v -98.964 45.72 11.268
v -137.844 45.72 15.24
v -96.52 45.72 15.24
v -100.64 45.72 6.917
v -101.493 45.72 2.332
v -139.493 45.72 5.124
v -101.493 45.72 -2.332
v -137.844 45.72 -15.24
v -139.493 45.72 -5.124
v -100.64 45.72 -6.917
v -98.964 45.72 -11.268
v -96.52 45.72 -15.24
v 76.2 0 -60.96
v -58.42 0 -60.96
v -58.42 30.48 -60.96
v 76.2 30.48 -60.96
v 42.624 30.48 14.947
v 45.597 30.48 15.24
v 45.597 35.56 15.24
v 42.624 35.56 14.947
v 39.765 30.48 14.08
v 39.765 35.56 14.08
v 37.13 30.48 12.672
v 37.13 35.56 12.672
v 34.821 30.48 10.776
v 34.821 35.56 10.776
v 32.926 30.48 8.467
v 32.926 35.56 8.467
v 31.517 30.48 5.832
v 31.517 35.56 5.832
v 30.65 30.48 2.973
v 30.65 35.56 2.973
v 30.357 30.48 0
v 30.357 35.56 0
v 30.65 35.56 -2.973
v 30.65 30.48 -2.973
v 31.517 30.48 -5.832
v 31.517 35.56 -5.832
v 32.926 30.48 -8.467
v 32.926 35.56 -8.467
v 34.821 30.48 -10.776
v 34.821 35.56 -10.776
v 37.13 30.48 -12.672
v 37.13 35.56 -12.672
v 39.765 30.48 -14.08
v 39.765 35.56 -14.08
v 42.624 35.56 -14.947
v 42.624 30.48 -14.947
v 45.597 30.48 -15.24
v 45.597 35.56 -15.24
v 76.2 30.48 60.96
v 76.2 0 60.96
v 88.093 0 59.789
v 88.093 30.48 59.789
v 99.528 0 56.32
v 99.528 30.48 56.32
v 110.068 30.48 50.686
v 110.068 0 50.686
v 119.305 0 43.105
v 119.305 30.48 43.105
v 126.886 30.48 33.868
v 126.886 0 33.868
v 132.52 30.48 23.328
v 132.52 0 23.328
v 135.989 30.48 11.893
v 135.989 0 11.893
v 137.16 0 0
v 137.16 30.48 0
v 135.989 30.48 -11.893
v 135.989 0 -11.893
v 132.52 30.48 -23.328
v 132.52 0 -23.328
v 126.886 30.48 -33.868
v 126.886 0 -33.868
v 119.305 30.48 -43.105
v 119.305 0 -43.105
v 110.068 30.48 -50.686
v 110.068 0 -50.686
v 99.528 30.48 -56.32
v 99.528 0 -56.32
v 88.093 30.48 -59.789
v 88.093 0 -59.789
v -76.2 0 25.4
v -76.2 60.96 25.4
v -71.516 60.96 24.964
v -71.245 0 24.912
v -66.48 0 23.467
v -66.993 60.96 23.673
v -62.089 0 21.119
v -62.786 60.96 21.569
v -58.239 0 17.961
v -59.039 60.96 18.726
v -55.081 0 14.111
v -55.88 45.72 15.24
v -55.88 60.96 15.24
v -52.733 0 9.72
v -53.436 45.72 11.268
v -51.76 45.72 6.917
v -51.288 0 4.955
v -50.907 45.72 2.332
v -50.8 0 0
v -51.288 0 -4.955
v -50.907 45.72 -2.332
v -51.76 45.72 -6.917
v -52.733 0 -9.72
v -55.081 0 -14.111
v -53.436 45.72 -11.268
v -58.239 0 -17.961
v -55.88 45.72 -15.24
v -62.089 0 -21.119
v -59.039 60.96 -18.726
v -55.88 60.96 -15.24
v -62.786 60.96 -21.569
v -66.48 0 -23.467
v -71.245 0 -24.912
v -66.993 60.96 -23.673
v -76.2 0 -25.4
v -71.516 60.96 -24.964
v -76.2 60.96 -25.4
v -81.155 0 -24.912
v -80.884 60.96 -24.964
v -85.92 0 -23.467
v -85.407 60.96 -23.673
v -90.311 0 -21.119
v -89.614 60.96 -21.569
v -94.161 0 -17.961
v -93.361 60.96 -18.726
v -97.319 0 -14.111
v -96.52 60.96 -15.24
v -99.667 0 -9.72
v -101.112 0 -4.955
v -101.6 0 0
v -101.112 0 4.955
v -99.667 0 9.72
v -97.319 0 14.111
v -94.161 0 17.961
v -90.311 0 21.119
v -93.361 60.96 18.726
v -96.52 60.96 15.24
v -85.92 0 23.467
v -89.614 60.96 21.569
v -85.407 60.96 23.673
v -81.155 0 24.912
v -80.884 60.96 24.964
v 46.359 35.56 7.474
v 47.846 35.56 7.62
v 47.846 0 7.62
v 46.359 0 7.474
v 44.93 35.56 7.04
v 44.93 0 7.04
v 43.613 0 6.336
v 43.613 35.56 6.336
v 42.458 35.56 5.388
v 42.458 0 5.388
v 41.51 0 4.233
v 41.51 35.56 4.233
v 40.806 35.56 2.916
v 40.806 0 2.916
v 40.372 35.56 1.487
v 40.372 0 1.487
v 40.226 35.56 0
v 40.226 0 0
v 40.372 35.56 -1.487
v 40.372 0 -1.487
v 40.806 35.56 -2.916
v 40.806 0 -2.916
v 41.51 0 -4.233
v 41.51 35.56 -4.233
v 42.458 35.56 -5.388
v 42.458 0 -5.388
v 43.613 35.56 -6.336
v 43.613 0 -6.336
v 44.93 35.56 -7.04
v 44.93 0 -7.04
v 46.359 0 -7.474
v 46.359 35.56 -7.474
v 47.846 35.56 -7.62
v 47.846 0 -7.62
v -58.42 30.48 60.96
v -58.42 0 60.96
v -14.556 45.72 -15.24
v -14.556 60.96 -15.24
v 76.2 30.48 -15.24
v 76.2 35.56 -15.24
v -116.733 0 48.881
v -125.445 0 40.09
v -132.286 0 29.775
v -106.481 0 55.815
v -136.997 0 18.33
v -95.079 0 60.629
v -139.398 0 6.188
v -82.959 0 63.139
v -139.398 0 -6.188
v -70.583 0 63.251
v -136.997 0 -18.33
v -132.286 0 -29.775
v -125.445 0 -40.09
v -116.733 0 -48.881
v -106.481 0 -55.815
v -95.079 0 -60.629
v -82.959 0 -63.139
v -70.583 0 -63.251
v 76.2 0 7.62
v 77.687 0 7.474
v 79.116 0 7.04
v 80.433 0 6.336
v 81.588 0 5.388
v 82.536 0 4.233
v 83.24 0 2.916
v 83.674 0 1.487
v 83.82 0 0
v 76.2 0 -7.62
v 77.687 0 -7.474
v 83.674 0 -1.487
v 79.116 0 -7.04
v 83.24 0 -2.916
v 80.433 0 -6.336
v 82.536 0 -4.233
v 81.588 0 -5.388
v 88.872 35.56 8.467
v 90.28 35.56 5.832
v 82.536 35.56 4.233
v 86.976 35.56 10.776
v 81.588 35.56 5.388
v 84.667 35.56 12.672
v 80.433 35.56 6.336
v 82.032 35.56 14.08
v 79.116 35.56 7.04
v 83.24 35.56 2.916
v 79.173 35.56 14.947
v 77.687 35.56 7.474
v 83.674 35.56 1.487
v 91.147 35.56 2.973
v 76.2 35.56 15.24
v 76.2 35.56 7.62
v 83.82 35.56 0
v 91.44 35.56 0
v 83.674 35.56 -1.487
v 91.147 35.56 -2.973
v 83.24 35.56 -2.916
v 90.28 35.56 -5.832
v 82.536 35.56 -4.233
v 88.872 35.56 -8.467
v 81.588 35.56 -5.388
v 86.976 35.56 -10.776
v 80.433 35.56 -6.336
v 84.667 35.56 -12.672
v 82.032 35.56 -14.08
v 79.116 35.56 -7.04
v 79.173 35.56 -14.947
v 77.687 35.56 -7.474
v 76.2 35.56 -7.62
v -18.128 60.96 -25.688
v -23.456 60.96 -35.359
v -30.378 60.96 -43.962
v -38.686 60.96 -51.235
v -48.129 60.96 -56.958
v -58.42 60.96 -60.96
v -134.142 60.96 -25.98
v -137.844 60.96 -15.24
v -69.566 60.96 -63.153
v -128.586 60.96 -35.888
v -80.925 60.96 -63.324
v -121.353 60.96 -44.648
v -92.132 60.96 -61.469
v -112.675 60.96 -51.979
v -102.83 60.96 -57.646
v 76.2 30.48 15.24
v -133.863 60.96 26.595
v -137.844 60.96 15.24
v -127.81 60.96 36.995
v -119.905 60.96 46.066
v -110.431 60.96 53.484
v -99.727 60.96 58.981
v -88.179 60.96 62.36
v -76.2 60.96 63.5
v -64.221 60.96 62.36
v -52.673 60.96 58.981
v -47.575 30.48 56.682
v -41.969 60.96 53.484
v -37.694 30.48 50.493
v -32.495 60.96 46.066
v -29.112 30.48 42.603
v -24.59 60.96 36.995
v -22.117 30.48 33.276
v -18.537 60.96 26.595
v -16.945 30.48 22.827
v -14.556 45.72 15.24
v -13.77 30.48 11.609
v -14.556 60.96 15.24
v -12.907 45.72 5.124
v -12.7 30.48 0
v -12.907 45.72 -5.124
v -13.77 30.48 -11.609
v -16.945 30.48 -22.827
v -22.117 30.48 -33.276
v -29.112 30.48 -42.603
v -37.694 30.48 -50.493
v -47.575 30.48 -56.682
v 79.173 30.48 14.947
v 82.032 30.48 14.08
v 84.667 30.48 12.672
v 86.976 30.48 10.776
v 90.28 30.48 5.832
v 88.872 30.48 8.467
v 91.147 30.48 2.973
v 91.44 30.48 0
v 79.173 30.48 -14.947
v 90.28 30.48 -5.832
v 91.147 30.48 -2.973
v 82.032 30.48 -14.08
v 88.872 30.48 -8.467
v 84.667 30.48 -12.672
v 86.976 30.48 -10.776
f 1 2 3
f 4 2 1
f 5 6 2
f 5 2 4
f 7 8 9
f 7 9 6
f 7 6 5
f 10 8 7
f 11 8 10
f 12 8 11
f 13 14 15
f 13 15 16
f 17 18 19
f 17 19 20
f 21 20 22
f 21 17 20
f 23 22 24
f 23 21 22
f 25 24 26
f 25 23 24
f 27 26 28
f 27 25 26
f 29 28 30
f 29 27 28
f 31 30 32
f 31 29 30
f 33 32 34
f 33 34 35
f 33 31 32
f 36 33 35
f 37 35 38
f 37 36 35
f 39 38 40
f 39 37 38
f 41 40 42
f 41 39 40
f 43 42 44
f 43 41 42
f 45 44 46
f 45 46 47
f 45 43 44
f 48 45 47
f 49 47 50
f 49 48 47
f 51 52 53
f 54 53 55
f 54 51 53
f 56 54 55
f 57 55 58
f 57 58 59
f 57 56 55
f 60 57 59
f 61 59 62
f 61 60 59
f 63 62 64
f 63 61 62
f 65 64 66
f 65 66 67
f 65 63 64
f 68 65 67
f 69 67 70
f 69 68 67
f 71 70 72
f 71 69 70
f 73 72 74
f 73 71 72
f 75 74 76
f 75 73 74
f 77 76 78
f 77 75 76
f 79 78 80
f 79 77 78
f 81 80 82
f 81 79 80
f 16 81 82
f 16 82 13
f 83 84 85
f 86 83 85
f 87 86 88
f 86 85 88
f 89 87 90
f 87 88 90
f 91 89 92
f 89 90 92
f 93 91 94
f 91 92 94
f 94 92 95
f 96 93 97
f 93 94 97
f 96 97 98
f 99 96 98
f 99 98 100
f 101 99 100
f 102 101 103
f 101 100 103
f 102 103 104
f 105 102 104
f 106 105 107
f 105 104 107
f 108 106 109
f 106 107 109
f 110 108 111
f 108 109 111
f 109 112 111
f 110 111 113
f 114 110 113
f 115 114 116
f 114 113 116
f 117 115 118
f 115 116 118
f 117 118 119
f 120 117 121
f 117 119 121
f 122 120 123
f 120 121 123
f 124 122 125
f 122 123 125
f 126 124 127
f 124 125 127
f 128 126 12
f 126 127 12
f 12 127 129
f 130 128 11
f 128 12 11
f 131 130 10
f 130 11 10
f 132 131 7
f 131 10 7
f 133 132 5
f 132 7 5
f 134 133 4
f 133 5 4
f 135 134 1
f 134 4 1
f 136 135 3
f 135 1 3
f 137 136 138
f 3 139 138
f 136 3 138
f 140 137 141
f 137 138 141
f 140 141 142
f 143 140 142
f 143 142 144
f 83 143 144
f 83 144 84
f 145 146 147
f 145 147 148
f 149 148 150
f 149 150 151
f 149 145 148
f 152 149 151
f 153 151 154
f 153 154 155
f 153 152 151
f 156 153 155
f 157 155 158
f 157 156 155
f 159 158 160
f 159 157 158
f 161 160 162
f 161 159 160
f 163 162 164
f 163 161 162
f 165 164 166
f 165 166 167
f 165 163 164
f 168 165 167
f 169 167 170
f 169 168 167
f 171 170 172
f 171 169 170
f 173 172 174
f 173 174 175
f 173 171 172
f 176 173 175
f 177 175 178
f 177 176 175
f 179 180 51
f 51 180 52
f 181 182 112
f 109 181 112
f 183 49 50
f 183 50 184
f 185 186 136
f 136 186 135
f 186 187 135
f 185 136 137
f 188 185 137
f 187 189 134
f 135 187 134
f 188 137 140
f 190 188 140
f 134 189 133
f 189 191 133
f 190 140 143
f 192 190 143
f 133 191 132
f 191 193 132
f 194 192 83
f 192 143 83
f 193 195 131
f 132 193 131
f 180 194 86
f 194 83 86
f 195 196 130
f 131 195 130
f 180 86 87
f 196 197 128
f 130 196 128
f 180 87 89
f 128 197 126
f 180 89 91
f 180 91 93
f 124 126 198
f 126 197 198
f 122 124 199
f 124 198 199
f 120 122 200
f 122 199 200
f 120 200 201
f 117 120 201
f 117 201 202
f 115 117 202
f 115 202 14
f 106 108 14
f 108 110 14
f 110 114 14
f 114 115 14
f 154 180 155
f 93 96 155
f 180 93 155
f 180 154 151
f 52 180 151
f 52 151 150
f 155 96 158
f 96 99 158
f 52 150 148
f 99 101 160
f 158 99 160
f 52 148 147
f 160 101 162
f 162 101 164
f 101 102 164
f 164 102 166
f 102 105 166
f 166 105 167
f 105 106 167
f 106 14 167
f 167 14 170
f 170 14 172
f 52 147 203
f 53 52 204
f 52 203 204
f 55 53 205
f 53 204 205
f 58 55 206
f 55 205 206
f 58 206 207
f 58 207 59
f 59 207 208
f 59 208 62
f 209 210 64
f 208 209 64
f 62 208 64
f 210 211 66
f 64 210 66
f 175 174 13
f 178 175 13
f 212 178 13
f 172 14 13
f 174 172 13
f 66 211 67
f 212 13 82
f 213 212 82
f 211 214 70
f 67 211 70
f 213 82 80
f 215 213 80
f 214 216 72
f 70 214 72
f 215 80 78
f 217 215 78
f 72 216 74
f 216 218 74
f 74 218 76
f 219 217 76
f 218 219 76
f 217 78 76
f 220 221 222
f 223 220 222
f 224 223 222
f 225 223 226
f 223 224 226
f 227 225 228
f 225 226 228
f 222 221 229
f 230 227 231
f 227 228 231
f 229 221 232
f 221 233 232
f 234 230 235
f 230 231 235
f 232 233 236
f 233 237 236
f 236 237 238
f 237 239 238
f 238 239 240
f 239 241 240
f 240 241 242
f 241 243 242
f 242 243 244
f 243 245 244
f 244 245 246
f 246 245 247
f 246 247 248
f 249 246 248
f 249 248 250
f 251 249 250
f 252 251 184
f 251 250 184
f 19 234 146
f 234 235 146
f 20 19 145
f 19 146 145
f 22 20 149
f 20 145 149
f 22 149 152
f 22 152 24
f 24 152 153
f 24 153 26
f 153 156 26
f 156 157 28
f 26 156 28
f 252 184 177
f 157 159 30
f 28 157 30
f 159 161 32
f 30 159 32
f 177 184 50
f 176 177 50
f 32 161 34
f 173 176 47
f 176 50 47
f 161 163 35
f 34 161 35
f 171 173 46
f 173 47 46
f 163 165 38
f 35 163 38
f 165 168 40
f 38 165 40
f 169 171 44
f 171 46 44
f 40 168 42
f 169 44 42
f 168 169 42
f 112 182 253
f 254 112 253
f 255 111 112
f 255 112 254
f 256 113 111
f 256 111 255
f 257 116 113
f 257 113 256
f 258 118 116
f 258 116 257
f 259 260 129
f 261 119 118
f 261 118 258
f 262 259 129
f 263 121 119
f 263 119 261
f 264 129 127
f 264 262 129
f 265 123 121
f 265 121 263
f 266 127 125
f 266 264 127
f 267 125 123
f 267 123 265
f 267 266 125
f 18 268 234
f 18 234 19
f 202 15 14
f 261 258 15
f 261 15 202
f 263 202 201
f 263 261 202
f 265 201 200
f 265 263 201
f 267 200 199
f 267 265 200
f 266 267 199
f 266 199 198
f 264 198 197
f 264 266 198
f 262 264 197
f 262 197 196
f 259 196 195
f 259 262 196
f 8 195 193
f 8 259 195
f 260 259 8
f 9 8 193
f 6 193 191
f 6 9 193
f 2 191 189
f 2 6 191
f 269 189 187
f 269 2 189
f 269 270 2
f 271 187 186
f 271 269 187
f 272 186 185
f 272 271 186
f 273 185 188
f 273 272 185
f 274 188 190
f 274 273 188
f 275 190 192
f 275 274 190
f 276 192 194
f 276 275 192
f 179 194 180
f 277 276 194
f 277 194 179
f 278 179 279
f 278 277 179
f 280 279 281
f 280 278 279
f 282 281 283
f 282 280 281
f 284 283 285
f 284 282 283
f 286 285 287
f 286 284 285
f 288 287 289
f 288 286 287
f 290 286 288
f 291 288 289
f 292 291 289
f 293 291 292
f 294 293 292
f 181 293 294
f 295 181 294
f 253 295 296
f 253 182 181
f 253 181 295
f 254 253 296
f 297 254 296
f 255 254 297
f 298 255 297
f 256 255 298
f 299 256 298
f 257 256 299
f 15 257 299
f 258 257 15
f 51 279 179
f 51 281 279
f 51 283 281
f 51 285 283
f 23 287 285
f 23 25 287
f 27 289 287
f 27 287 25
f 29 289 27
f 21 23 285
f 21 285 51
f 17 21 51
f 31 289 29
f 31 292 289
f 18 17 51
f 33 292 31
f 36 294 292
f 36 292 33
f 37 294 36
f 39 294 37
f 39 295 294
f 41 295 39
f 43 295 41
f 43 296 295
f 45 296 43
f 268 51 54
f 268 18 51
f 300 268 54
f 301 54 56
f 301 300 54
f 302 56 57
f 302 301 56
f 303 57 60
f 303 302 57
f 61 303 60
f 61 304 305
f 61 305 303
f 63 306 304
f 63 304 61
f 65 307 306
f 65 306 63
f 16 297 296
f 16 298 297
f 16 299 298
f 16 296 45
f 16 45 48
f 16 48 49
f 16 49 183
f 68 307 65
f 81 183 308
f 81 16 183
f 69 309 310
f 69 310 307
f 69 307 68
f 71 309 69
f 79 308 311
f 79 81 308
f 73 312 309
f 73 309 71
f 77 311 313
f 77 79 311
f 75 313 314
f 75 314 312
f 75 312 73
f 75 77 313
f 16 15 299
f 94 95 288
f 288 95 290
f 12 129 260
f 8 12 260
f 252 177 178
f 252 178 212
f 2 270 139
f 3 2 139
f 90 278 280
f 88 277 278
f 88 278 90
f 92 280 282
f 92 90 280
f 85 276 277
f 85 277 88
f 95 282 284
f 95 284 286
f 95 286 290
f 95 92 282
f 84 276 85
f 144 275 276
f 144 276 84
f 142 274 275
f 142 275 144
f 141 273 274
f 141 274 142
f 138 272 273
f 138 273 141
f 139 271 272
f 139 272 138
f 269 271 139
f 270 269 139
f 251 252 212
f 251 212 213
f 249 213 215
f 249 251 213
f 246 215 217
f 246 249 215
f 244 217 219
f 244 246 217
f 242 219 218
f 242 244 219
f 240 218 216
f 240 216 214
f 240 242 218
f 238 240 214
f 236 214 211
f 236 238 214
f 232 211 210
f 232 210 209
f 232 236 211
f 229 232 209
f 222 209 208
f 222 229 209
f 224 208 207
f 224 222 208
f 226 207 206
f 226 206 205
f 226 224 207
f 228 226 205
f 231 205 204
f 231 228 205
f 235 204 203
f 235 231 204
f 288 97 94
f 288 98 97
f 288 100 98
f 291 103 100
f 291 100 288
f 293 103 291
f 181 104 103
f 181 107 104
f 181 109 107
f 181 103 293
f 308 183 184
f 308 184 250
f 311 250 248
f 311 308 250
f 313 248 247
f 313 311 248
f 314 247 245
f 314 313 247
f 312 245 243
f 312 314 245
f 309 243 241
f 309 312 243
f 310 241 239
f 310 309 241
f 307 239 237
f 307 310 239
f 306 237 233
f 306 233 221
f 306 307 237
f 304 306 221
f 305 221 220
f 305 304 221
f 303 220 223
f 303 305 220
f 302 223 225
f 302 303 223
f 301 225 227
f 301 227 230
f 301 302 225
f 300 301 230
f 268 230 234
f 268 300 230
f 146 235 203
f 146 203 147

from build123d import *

# Parameters (mm, degrees)
SKETCH2_W           = 152.4
SKETCH2_H           = 121.92
BOSS_EXTRUDE1_DEPTH = 30.48
SKETCH3_R           = 63.5
BOSS_EXTRUDE2_DEPTH = 30.48
SKETCH4_R           = 25.4
CUT_EXTRUDE1_DEPTH  = 60.96
BOSS_EXTRUDE3_DEPTH = 30.48
BOSS_EXTRUDE5_DEPTH = 5.08
CUT_EXTRUDE4_DEPTH  = 35.56
CUT_EXTRUDE5_DEPTH  = 15.24


with BuildPart() as part:
    # Sketch2 → Boss-Extrude1 (new body)
    with BuildSketch(Plane(origin=(0, 0, 0), x_dir=(1, 0, 0), z_dir=(0, 1, 0))):
        Rectangle(SKETCH2_W, SKETCH2_H)
    extrude(amount=BOSS_EXTRUDE1_DEPTH)

    # Sketch3 → Boss-Extrude2 (add, symmetric)
    with BuildSketch(Plane(origin=(0, 30.48, 0), x_dir=(1, 0, 0), z_dir=(0, 1, 0))):
        with Locations(Location((-76.2, 0, 0), (0, 0, 73.739795292))):
            Circle(SKETCH3_R)
    extrude(amount=BOSS_EXTRUDE2_DEPTH, both=True)

    # Sketch4 → Cut-Extrude1 (cut)
    with BuildSketch(Plane(origin=(0, 60.96, 0), x_dir=(1, 0, 0), z_dir=(0, 1, 0))):
        with Locations(Location((-76.2, 0, 0), (0, 0, 270))):
            Circle(SKETCH4_R)
    extrude(amount=-CUT_EXTRUDE1_DEPTH, mode=Mode.SUBTRACT)

    # Sketch5 → Boss-Extrude3 (add)
    with BuildSketch(Plane(origin=(0, 30.48, 0), x_dir=(1, 0, 0), z_dir=(0, 1, 0))):
        with BuildLine():
            Line((76.2, 60.96), (76.2, -60.96))
            ThreePointArc((76.2, -60.96), (137.16, 0), (76.2, 60.96))
        make_face()
    extrude(amount=-BOSS_EXTRUDE3_DEPTH)

    # Sketch6 → Boss-Extrude5 (add)
    with BuildSketch(Plane(origin=(0, 30.48, 0), x_dir=(1, 0, 0), z_dir=(0, 1, 0))):
        with BuildLine():
            Line((76.2, -15.24), (45.597337332, -15.24))
            ThreePointArc((45.597337332, -15.24), (30.357337332, 0), (45.597337332, 15.24))
            Line((45.597337332, 15.24), (76.2, 15.24))
            ThreePointArc((76.2, 15.24), (91.44, 0), (76.2, -15.24))
        make_face()
    extrude(amount=BOSS_EXTRUDE5_DEPTH)

    # Sketch12 → Cut-Extrude4 (cut)
    with BuildSketch(Plane(origin=(0, 35.56, 0), x_dir=(1, 0, 0), z_dir=(0, 1, 0))):
        with BuildLine():
            Line((76.2, -7.62), (47.846010547, -7.62))
            ThreePointArc((47.846010547, -7.62), (40.226010547, 0), (47.846010547, 7.62))
            Line((47.846010547, 7.62), (76.2, 7.62))
            ThreePointArc((76.2, 7.62), (83.82, 0), (76.2, -7.62))
        make_face()
    extrude(amount=-CUT_EXTRUDE4_DEPTH, mode=Mode.SUBTRACT)

    # Sketch14 → Cut-Extrude5 (cut)
    with BuildSketch(Plane(origin=(0, 60.96, 0), x_dir=(1, 0, 0), z_dir=(0, 1, 0))):
        with BuildLine():
            Line((-137.844078386, -15.24), (-14.555921614, -15.24))
            ThreePointArc((-14.555921614, -15.24), (-12.7, 0), (-14.555921614, 15.24))
            Line((-14.555921614, 15.24), (-137.844078386, 15.24))
            ThreePointArc((-137.844078386, 15.24), (-139.7, 0), (-137.844078386, -15.24))
        make_face()
    extrude(amount=-CUT_EXTRUDE5_DEPTH, mode=Mode.SUBTRACT)


solid = part.part
